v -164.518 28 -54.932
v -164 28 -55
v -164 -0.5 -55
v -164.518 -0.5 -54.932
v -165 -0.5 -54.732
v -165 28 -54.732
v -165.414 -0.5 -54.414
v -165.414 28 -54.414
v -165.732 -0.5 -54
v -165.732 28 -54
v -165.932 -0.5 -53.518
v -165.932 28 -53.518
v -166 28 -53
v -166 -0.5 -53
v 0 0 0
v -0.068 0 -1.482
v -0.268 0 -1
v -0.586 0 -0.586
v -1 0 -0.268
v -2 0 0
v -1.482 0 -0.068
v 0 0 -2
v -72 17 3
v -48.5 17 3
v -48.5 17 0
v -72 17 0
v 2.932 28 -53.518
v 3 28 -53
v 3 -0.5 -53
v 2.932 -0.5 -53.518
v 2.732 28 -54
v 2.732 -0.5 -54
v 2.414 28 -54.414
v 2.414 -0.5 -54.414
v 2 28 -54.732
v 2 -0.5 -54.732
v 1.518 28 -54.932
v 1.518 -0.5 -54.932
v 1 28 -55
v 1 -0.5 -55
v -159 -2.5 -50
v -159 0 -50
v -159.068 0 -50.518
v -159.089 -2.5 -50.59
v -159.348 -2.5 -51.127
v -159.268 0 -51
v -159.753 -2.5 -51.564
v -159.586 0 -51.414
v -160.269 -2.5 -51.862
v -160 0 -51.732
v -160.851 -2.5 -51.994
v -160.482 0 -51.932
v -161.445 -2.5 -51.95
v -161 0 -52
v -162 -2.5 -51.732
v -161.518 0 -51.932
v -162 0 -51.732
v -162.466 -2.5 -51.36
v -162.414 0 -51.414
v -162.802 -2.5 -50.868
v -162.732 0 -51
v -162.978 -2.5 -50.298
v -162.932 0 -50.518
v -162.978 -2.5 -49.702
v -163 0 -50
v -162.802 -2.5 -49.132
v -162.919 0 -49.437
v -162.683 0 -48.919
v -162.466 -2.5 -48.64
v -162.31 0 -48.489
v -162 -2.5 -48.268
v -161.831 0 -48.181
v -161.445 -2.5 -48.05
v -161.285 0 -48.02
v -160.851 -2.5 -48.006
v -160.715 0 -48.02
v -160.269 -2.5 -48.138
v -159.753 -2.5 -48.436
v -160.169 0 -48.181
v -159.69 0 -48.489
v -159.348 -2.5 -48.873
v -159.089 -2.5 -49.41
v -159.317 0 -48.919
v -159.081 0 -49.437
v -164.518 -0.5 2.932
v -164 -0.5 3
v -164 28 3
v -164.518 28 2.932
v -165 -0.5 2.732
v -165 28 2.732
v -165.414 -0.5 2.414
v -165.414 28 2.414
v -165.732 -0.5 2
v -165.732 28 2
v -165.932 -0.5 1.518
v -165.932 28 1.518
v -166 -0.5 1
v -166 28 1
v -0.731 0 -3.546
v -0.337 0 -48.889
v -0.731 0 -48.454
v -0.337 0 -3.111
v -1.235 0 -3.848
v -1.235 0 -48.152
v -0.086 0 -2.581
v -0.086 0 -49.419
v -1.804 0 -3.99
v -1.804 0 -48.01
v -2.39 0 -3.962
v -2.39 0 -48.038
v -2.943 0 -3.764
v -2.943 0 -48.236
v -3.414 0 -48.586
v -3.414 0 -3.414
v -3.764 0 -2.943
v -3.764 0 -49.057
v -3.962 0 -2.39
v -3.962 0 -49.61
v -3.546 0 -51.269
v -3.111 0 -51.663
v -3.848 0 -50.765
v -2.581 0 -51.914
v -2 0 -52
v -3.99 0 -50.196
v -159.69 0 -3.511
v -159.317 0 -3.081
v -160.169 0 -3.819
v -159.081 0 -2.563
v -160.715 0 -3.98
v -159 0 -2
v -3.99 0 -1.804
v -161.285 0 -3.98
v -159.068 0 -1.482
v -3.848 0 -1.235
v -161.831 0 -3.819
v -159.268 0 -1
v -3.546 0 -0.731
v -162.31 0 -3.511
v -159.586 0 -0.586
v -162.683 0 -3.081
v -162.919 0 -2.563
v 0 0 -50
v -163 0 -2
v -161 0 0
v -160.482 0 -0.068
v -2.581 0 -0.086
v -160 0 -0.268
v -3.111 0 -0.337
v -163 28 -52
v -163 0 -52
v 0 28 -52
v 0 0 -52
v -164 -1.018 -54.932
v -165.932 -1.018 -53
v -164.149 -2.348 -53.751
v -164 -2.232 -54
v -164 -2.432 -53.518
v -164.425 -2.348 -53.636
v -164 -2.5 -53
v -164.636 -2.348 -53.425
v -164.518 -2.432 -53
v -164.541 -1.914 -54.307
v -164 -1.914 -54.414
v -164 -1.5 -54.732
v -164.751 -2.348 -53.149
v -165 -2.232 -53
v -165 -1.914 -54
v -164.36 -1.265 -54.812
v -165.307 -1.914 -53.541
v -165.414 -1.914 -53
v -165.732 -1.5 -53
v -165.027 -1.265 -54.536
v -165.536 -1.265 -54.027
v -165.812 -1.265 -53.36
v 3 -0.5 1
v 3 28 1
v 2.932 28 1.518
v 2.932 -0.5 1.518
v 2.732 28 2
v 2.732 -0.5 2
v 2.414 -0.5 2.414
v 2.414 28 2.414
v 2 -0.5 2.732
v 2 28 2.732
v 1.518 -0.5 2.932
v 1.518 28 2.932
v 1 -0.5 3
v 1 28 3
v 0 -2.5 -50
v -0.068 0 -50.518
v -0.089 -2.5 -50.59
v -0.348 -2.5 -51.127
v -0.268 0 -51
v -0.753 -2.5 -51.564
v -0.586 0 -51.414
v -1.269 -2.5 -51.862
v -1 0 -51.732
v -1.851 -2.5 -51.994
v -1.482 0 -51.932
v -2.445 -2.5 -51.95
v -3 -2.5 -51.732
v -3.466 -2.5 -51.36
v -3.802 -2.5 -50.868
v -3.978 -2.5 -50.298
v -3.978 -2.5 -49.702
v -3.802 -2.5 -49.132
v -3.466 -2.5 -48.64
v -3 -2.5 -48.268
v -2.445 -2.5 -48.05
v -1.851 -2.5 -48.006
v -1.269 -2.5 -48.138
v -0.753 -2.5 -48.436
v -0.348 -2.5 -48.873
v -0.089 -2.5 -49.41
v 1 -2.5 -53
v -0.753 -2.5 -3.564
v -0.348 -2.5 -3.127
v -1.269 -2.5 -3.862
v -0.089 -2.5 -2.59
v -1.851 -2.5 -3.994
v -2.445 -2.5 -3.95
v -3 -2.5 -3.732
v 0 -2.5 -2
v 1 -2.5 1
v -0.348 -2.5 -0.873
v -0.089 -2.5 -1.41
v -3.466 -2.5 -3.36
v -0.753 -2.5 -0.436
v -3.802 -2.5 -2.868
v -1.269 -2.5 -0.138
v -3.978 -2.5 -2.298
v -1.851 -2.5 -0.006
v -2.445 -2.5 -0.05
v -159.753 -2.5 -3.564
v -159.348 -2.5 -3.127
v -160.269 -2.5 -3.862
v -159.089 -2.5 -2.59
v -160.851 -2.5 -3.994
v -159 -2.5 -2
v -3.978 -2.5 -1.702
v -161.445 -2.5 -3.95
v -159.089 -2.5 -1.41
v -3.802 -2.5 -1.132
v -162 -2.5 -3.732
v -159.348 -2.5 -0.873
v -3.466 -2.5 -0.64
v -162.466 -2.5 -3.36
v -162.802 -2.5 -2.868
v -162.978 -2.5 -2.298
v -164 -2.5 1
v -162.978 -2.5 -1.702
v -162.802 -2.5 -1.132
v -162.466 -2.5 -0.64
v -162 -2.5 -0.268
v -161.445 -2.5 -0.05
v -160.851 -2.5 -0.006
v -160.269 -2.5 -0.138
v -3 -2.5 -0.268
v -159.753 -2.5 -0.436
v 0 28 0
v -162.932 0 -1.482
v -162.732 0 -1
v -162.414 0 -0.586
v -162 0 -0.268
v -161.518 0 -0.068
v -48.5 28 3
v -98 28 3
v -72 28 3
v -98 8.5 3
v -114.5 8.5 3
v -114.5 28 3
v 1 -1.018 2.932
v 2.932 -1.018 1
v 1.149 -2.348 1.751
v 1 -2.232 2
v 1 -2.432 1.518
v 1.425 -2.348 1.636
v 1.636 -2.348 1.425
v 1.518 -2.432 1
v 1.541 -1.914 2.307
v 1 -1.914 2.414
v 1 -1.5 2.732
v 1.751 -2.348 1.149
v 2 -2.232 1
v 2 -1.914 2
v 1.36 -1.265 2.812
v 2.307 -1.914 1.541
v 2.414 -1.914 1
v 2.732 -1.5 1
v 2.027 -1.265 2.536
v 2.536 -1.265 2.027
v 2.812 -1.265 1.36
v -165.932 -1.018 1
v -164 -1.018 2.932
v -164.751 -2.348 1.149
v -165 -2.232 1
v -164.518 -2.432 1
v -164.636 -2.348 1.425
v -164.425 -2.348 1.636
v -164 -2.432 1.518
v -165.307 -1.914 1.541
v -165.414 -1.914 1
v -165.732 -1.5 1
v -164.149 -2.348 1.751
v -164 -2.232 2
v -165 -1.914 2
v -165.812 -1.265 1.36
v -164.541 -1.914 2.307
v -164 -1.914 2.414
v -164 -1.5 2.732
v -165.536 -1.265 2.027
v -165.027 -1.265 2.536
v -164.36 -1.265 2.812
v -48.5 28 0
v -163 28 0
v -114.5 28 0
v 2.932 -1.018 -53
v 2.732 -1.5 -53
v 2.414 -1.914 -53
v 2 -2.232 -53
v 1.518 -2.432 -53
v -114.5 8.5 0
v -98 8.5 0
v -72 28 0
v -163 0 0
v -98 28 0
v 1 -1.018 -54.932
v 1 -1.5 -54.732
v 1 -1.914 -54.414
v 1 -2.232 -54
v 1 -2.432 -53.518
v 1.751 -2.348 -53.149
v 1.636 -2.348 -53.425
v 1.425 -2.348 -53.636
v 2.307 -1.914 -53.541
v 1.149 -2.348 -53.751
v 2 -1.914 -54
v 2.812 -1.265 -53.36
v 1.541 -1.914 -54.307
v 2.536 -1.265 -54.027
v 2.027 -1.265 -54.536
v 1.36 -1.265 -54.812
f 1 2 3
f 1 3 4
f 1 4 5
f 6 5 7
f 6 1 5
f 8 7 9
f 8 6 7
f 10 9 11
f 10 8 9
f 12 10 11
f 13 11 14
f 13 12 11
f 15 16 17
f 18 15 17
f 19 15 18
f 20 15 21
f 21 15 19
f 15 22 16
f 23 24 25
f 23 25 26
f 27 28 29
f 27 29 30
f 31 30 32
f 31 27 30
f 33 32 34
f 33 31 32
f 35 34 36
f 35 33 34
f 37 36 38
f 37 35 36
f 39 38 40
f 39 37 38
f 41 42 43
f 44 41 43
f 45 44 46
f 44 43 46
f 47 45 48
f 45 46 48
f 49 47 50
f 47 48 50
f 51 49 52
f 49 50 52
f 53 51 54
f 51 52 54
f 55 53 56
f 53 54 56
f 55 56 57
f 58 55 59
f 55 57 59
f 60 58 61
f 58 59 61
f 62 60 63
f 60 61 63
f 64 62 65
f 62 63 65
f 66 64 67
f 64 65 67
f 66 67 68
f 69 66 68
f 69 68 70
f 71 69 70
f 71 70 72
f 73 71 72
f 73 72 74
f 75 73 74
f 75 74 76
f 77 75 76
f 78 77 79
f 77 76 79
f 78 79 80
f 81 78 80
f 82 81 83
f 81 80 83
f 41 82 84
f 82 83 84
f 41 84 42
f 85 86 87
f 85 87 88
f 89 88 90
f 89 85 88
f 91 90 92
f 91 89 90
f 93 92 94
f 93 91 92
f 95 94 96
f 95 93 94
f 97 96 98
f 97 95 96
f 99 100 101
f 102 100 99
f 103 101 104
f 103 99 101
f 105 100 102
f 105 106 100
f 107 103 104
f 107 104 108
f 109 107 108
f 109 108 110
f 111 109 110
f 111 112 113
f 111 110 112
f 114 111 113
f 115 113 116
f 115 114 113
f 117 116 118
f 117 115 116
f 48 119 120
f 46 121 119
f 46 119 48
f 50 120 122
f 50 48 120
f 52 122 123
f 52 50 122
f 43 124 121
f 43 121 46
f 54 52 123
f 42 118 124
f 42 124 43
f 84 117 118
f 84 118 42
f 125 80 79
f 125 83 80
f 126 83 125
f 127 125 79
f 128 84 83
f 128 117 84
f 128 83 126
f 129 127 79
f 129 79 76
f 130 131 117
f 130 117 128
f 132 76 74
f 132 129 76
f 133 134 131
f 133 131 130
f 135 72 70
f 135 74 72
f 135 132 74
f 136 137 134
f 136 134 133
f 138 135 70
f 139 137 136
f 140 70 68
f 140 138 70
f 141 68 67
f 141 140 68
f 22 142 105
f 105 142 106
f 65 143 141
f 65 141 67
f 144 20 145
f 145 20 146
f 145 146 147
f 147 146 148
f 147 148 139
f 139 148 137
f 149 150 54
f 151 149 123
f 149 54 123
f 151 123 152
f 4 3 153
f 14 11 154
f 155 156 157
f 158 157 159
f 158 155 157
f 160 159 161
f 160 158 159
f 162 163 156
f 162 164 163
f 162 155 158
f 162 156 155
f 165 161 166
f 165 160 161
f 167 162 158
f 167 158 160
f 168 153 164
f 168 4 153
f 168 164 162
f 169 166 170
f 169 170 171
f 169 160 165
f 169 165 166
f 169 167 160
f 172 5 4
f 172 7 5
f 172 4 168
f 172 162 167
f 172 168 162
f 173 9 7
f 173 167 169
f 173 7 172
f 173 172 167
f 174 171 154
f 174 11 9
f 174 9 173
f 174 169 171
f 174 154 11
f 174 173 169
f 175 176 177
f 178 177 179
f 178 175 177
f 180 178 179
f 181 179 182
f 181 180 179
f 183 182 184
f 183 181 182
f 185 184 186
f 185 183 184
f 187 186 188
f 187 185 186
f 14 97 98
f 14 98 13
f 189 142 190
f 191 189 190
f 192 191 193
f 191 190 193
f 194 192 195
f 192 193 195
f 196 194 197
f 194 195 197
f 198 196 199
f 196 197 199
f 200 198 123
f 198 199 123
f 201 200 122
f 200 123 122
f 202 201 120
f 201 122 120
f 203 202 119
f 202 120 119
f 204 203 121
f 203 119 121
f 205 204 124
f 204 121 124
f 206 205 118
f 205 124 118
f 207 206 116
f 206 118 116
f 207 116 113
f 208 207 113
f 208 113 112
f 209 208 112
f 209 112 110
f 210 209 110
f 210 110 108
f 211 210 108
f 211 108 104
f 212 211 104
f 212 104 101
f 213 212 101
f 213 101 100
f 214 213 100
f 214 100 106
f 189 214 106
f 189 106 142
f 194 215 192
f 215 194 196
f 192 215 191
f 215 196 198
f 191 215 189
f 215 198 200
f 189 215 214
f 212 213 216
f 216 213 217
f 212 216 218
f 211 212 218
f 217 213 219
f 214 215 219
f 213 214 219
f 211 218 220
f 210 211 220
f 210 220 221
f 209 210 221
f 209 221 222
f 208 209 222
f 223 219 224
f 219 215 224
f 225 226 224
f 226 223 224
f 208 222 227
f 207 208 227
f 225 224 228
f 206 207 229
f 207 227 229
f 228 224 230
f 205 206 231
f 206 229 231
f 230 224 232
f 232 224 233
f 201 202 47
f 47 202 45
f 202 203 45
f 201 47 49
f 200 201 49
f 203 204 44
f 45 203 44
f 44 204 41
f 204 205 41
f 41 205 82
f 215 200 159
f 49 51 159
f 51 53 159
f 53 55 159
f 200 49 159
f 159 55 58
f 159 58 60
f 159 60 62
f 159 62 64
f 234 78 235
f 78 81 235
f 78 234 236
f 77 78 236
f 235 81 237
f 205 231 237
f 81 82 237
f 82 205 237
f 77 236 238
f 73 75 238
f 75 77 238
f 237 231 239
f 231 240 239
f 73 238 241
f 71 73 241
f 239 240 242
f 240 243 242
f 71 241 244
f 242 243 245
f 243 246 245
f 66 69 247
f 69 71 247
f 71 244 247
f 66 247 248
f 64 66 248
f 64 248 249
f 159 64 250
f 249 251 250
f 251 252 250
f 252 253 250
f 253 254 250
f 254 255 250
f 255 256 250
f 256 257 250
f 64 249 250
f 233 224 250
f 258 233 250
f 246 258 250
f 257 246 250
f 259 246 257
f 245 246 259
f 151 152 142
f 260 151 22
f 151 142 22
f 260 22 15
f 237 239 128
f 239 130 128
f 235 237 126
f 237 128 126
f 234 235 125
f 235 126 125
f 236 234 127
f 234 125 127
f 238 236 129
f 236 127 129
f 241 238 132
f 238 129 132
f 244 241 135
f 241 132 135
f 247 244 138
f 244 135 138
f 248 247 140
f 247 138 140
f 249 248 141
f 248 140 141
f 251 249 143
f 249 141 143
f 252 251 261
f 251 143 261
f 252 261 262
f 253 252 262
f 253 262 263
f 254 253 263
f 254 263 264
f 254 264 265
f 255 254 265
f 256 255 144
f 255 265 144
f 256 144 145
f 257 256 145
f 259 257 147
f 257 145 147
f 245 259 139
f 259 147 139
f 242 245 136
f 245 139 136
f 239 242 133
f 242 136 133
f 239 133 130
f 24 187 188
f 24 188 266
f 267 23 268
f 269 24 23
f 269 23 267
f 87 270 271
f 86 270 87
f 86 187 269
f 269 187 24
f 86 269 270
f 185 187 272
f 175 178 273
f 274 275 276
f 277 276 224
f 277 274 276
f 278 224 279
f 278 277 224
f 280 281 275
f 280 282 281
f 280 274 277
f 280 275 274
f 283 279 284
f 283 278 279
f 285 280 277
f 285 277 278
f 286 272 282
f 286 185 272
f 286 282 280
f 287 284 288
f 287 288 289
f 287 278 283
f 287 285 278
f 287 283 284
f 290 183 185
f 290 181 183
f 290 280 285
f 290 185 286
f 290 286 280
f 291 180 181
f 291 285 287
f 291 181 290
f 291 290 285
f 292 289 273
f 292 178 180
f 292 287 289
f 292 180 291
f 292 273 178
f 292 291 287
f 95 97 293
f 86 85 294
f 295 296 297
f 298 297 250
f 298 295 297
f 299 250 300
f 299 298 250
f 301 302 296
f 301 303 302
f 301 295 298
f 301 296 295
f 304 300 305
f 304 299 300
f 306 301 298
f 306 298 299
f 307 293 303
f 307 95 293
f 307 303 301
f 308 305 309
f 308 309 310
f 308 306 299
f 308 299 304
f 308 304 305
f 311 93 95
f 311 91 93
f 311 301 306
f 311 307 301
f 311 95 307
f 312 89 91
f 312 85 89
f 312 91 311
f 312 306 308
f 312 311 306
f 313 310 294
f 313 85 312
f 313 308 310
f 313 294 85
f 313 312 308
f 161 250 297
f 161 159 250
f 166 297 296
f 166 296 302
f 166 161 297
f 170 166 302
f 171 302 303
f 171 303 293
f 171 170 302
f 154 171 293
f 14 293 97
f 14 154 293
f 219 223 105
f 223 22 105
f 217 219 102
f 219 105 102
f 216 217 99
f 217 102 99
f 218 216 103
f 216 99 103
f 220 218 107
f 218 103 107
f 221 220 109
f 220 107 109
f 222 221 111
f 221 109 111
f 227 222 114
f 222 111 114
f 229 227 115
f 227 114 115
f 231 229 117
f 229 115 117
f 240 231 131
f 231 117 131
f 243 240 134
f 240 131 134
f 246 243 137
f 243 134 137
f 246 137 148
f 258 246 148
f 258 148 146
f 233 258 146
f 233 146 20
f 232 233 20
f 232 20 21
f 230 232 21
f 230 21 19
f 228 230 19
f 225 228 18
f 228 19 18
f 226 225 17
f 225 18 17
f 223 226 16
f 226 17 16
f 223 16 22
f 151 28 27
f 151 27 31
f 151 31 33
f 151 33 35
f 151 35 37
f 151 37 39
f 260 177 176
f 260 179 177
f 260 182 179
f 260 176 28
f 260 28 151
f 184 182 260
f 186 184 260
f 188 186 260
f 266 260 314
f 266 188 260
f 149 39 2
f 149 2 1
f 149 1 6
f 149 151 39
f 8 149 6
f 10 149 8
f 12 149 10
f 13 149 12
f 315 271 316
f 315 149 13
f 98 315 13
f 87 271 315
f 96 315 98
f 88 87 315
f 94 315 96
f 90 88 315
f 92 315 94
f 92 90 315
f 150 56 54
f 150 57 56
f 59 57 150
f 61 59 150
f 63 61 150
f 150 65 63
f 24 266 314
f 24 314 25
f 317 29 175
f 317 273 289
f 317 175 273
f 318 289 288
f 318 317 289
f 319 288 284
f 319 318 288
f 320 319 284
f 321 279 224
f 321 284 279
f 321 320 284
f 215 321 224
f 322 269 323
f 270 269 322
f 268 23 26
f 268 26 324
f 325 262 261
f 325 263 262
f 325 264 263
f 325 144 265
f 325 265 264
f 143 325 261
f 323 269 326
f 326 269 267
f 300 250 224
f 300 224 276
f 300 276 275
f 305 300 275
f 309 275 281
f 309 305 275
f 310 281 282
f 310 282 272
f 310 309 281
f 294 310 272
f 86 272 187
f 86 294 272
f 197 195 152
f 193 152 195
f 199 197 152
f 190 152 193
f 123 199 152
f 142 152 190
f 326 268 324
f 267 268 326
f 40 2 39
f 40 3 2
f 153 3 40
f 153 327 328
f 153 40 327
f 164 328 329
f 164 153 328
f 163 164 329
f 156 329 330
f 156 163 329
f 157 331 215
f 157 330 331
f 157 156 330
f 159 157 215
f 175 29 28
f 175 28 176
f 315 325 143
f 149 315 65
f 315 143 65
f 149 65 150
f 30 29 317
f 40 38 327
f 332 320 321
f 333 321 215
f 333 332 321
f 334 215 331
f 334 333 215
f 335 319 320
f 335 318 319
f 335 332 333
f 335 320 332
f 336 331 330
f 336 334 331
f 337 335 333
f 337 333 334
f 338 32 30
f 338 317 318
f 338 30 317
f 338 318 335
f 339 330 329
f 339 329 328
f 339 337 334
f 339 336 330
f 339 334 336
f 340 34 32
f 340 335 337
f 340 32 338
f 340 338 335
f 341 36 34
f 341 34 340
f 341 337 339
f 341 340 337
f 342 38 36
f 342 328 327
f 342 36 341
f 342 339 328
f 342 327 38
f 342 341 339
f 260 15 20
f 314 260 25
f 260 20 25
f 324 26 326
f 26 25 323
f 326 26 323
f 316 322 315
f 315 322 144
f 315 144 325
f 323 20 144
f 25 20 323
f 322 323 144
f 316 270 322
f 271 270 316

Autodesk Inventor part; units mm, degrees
ref_plane "YZ Plane" through (0, 0, 0) normal (1, 0, 0) x (0, 1, 0)
ref_plane "XZ Plane" through (0, 0, 0) normal (0, 1, 0) x (-1, 0, 0)
ref_plane "XY Plane" through (0, 0, 0) normal (0, 0, 1) x (1, 0, 0)
sketch "Sketch1" plane through (0, 0, 0) normal (0, 1, 0) x (-1, 0, 0)
  line L0 (0, 0) -> (163, 0)
  line L1 (163, 0) -> (163, -52)
  line L2 (163, -52) -> (0, -52)
  line L3 (0, -52) -> (0, 0)
  line L4 (0, 0) -> (-3, 0)
  line L5 (-3, 0) -> (-3, 3)
  line L6 (-3, 3) -> (166, 3)
  line L7 (166, 3) -> (166, -55)
  line L8 (166, -55) -> (-3, -55)
  line L9 (-3, 0) -> (-3, -55)
  dimension "d0" = 163
  dimension "d1" = 52
  dimension "d2" = 3
  dimension "d3" = 3
  dimension "d4" = 169
  dimension "d5" = 58
  dimension "d6" = 169
extrude "Extrusion1" add sketch "Sketch1" along normal blind 28
sketch "Sketch2" plane through (-166, 0, 3) normal (0, 0, 1) x (1, 0, 0)
  line L0 (169, 0) -> (0, 0) projected
  line L1 (0, 0) -> (169, 0)
  line L2 (169, 0) -> (169, -2.5)
  line L3 (169, -2.5) -> (0, -2.5)
  line L4 (0, -2.5) -> (0, 0)
  point P0 (166, 0)
  dimension "d9" = 2.5
extrude "Extrusion2" add sketch "Sketch2" against normal blind 58
sketch "Sketch3" plane through (-166, 28, 3) normal (0, 0, 1) x (1, 0, 0)
  line L0 (94, 0) -> (117.5, 0)
  line L1 (117.5, 0) -> (117.5, -11)
  line L2 (117.5, -11) -> (94, -11)
  line L3 (94, -11) -> (94, 0)
  line L4 (169, -30.5) -> (169, 0) projected
  line L5 (0, -30.5) -> (0, 0) projected
  line L6 (166, -28) -> (3, -28) projected
  line L7 (0, 0) -> (169, 0) projected
  line L8 (51.5, -11) -> (68, -11)
  line L9 (68, -11) -> (68, -19.5)
  line L10 (68, -19.5) -> (51.5, -19.5)
  line L11 (51.5, -19.5) -> (51.5, -11)
  line L12 (51.5, -11) -> (68, -19.5) construction
  line L13 (68, -11) -> (51.5, -19.5) construction
  line L14 (0, -30.5) -> (169, -30.5) projected
  line L15 (51.5, -11) -> (51.5, 0)
  line L16 (68, -11) -> (68, 0)
  line L17 (51.5, 0) -> (68, 0)
  point P0 (59.75, -15.25)
  dimension "d12" = 75
  dimension "d13" = 117.5
  dimension "d14" = 17
  dimension "d15" = 0
  dimension "d16" = 23.5
  dimension "d17" = 16.5
  dimension "d18" = 8.5
  dimension "d19" = 30.5
  dimension "d20" = 15.25
  dimension "d21" = 51.5
  dimension "d22" = 51.5
extrude "Extrusion3" cut sketch "Sketch3" against normal blind 10 contours L0 L1 L2 L3 | L16 L8 L15 L7 | L9 L10 L11 L8
sketch "Sketch4" plane through (-166, -2.5, 3) normal (0, 0, 1) x (1, 0, 0)
  point P0 (166, 2.5)
sketch "Sketch5" plane through (-163, 0, -52) normal (0, 1, 0) x (1, 0, 0)
  circle A0 centre (161, -50) radius 2
  circle A1 centre (161, -2) radius 2
  circle A2 centre (2, -2) radius 2
  circle A3 centre (2, -50) radius 2
  point P0 (163, -52)
  dimension "d25" = 4
  dimension "d26" = 4
  dimension "d27" = 4
  dimension "d28" = 4
  dimension "d29" = 48
  dimension "d30" = 159
extrude "Extrusion4" cut sketch "Sketch5" against normal blind 10
fillet "Fillet1" radius 2 8 edges at (3, 12.75, 3) (3, 12.75, -55) (-166, 12.75, -55) (-166, 12.75, 3) (-81.5, -2.5, -55) (-166, -2.5, -26) (-81.5, -2.5, 3) (3, -2.5, -26)
sketch "Sketch6" plane through (-161, 0, -52) normal (0, 1, 0) x (1, 0, 0)
  line L0 (164, -53) -> (164, 1) projected
  line L1 (-5, 1) -> (-5, -53) projected
  line L2 (162, 3) -> (-3, 3) projected
  line L3 (112.5, -55) -> (162, -55) projected
  point P0 (161, -52)
  dimension "d34" = 169
  dimension "d35" = 58
sketch "Sketch7" plane through (-98, 28, 3) normal (0, 0, 1) x (1, 0, 0)
  line L0 (49.5, 0) -> (49.5, -11) projected
  line L1 (101, -28.5) -> (101, 0) projected
  line L2 (26, -11) -> (49.5, -11) projected
  line L3 (99, 0) -> (-66, 0) projected
  line L4 (-68, 0) -> (-68, -28.5) projected
  line L5 (-16.5, -19.5) -> (-16.5, 0) projected
  line L6 (0, -19.5) -> (-16.5, -19.5) projected
  line L7 (26, -11) -> (26, 0) projected
  point P0 (98, -28)
  dimension "d36" = 51.5
  dimension "d37" = 11
  dimension "d38" = 51.5
  dimension "d39" = 19.5
  dimension "d40" = 23.5
